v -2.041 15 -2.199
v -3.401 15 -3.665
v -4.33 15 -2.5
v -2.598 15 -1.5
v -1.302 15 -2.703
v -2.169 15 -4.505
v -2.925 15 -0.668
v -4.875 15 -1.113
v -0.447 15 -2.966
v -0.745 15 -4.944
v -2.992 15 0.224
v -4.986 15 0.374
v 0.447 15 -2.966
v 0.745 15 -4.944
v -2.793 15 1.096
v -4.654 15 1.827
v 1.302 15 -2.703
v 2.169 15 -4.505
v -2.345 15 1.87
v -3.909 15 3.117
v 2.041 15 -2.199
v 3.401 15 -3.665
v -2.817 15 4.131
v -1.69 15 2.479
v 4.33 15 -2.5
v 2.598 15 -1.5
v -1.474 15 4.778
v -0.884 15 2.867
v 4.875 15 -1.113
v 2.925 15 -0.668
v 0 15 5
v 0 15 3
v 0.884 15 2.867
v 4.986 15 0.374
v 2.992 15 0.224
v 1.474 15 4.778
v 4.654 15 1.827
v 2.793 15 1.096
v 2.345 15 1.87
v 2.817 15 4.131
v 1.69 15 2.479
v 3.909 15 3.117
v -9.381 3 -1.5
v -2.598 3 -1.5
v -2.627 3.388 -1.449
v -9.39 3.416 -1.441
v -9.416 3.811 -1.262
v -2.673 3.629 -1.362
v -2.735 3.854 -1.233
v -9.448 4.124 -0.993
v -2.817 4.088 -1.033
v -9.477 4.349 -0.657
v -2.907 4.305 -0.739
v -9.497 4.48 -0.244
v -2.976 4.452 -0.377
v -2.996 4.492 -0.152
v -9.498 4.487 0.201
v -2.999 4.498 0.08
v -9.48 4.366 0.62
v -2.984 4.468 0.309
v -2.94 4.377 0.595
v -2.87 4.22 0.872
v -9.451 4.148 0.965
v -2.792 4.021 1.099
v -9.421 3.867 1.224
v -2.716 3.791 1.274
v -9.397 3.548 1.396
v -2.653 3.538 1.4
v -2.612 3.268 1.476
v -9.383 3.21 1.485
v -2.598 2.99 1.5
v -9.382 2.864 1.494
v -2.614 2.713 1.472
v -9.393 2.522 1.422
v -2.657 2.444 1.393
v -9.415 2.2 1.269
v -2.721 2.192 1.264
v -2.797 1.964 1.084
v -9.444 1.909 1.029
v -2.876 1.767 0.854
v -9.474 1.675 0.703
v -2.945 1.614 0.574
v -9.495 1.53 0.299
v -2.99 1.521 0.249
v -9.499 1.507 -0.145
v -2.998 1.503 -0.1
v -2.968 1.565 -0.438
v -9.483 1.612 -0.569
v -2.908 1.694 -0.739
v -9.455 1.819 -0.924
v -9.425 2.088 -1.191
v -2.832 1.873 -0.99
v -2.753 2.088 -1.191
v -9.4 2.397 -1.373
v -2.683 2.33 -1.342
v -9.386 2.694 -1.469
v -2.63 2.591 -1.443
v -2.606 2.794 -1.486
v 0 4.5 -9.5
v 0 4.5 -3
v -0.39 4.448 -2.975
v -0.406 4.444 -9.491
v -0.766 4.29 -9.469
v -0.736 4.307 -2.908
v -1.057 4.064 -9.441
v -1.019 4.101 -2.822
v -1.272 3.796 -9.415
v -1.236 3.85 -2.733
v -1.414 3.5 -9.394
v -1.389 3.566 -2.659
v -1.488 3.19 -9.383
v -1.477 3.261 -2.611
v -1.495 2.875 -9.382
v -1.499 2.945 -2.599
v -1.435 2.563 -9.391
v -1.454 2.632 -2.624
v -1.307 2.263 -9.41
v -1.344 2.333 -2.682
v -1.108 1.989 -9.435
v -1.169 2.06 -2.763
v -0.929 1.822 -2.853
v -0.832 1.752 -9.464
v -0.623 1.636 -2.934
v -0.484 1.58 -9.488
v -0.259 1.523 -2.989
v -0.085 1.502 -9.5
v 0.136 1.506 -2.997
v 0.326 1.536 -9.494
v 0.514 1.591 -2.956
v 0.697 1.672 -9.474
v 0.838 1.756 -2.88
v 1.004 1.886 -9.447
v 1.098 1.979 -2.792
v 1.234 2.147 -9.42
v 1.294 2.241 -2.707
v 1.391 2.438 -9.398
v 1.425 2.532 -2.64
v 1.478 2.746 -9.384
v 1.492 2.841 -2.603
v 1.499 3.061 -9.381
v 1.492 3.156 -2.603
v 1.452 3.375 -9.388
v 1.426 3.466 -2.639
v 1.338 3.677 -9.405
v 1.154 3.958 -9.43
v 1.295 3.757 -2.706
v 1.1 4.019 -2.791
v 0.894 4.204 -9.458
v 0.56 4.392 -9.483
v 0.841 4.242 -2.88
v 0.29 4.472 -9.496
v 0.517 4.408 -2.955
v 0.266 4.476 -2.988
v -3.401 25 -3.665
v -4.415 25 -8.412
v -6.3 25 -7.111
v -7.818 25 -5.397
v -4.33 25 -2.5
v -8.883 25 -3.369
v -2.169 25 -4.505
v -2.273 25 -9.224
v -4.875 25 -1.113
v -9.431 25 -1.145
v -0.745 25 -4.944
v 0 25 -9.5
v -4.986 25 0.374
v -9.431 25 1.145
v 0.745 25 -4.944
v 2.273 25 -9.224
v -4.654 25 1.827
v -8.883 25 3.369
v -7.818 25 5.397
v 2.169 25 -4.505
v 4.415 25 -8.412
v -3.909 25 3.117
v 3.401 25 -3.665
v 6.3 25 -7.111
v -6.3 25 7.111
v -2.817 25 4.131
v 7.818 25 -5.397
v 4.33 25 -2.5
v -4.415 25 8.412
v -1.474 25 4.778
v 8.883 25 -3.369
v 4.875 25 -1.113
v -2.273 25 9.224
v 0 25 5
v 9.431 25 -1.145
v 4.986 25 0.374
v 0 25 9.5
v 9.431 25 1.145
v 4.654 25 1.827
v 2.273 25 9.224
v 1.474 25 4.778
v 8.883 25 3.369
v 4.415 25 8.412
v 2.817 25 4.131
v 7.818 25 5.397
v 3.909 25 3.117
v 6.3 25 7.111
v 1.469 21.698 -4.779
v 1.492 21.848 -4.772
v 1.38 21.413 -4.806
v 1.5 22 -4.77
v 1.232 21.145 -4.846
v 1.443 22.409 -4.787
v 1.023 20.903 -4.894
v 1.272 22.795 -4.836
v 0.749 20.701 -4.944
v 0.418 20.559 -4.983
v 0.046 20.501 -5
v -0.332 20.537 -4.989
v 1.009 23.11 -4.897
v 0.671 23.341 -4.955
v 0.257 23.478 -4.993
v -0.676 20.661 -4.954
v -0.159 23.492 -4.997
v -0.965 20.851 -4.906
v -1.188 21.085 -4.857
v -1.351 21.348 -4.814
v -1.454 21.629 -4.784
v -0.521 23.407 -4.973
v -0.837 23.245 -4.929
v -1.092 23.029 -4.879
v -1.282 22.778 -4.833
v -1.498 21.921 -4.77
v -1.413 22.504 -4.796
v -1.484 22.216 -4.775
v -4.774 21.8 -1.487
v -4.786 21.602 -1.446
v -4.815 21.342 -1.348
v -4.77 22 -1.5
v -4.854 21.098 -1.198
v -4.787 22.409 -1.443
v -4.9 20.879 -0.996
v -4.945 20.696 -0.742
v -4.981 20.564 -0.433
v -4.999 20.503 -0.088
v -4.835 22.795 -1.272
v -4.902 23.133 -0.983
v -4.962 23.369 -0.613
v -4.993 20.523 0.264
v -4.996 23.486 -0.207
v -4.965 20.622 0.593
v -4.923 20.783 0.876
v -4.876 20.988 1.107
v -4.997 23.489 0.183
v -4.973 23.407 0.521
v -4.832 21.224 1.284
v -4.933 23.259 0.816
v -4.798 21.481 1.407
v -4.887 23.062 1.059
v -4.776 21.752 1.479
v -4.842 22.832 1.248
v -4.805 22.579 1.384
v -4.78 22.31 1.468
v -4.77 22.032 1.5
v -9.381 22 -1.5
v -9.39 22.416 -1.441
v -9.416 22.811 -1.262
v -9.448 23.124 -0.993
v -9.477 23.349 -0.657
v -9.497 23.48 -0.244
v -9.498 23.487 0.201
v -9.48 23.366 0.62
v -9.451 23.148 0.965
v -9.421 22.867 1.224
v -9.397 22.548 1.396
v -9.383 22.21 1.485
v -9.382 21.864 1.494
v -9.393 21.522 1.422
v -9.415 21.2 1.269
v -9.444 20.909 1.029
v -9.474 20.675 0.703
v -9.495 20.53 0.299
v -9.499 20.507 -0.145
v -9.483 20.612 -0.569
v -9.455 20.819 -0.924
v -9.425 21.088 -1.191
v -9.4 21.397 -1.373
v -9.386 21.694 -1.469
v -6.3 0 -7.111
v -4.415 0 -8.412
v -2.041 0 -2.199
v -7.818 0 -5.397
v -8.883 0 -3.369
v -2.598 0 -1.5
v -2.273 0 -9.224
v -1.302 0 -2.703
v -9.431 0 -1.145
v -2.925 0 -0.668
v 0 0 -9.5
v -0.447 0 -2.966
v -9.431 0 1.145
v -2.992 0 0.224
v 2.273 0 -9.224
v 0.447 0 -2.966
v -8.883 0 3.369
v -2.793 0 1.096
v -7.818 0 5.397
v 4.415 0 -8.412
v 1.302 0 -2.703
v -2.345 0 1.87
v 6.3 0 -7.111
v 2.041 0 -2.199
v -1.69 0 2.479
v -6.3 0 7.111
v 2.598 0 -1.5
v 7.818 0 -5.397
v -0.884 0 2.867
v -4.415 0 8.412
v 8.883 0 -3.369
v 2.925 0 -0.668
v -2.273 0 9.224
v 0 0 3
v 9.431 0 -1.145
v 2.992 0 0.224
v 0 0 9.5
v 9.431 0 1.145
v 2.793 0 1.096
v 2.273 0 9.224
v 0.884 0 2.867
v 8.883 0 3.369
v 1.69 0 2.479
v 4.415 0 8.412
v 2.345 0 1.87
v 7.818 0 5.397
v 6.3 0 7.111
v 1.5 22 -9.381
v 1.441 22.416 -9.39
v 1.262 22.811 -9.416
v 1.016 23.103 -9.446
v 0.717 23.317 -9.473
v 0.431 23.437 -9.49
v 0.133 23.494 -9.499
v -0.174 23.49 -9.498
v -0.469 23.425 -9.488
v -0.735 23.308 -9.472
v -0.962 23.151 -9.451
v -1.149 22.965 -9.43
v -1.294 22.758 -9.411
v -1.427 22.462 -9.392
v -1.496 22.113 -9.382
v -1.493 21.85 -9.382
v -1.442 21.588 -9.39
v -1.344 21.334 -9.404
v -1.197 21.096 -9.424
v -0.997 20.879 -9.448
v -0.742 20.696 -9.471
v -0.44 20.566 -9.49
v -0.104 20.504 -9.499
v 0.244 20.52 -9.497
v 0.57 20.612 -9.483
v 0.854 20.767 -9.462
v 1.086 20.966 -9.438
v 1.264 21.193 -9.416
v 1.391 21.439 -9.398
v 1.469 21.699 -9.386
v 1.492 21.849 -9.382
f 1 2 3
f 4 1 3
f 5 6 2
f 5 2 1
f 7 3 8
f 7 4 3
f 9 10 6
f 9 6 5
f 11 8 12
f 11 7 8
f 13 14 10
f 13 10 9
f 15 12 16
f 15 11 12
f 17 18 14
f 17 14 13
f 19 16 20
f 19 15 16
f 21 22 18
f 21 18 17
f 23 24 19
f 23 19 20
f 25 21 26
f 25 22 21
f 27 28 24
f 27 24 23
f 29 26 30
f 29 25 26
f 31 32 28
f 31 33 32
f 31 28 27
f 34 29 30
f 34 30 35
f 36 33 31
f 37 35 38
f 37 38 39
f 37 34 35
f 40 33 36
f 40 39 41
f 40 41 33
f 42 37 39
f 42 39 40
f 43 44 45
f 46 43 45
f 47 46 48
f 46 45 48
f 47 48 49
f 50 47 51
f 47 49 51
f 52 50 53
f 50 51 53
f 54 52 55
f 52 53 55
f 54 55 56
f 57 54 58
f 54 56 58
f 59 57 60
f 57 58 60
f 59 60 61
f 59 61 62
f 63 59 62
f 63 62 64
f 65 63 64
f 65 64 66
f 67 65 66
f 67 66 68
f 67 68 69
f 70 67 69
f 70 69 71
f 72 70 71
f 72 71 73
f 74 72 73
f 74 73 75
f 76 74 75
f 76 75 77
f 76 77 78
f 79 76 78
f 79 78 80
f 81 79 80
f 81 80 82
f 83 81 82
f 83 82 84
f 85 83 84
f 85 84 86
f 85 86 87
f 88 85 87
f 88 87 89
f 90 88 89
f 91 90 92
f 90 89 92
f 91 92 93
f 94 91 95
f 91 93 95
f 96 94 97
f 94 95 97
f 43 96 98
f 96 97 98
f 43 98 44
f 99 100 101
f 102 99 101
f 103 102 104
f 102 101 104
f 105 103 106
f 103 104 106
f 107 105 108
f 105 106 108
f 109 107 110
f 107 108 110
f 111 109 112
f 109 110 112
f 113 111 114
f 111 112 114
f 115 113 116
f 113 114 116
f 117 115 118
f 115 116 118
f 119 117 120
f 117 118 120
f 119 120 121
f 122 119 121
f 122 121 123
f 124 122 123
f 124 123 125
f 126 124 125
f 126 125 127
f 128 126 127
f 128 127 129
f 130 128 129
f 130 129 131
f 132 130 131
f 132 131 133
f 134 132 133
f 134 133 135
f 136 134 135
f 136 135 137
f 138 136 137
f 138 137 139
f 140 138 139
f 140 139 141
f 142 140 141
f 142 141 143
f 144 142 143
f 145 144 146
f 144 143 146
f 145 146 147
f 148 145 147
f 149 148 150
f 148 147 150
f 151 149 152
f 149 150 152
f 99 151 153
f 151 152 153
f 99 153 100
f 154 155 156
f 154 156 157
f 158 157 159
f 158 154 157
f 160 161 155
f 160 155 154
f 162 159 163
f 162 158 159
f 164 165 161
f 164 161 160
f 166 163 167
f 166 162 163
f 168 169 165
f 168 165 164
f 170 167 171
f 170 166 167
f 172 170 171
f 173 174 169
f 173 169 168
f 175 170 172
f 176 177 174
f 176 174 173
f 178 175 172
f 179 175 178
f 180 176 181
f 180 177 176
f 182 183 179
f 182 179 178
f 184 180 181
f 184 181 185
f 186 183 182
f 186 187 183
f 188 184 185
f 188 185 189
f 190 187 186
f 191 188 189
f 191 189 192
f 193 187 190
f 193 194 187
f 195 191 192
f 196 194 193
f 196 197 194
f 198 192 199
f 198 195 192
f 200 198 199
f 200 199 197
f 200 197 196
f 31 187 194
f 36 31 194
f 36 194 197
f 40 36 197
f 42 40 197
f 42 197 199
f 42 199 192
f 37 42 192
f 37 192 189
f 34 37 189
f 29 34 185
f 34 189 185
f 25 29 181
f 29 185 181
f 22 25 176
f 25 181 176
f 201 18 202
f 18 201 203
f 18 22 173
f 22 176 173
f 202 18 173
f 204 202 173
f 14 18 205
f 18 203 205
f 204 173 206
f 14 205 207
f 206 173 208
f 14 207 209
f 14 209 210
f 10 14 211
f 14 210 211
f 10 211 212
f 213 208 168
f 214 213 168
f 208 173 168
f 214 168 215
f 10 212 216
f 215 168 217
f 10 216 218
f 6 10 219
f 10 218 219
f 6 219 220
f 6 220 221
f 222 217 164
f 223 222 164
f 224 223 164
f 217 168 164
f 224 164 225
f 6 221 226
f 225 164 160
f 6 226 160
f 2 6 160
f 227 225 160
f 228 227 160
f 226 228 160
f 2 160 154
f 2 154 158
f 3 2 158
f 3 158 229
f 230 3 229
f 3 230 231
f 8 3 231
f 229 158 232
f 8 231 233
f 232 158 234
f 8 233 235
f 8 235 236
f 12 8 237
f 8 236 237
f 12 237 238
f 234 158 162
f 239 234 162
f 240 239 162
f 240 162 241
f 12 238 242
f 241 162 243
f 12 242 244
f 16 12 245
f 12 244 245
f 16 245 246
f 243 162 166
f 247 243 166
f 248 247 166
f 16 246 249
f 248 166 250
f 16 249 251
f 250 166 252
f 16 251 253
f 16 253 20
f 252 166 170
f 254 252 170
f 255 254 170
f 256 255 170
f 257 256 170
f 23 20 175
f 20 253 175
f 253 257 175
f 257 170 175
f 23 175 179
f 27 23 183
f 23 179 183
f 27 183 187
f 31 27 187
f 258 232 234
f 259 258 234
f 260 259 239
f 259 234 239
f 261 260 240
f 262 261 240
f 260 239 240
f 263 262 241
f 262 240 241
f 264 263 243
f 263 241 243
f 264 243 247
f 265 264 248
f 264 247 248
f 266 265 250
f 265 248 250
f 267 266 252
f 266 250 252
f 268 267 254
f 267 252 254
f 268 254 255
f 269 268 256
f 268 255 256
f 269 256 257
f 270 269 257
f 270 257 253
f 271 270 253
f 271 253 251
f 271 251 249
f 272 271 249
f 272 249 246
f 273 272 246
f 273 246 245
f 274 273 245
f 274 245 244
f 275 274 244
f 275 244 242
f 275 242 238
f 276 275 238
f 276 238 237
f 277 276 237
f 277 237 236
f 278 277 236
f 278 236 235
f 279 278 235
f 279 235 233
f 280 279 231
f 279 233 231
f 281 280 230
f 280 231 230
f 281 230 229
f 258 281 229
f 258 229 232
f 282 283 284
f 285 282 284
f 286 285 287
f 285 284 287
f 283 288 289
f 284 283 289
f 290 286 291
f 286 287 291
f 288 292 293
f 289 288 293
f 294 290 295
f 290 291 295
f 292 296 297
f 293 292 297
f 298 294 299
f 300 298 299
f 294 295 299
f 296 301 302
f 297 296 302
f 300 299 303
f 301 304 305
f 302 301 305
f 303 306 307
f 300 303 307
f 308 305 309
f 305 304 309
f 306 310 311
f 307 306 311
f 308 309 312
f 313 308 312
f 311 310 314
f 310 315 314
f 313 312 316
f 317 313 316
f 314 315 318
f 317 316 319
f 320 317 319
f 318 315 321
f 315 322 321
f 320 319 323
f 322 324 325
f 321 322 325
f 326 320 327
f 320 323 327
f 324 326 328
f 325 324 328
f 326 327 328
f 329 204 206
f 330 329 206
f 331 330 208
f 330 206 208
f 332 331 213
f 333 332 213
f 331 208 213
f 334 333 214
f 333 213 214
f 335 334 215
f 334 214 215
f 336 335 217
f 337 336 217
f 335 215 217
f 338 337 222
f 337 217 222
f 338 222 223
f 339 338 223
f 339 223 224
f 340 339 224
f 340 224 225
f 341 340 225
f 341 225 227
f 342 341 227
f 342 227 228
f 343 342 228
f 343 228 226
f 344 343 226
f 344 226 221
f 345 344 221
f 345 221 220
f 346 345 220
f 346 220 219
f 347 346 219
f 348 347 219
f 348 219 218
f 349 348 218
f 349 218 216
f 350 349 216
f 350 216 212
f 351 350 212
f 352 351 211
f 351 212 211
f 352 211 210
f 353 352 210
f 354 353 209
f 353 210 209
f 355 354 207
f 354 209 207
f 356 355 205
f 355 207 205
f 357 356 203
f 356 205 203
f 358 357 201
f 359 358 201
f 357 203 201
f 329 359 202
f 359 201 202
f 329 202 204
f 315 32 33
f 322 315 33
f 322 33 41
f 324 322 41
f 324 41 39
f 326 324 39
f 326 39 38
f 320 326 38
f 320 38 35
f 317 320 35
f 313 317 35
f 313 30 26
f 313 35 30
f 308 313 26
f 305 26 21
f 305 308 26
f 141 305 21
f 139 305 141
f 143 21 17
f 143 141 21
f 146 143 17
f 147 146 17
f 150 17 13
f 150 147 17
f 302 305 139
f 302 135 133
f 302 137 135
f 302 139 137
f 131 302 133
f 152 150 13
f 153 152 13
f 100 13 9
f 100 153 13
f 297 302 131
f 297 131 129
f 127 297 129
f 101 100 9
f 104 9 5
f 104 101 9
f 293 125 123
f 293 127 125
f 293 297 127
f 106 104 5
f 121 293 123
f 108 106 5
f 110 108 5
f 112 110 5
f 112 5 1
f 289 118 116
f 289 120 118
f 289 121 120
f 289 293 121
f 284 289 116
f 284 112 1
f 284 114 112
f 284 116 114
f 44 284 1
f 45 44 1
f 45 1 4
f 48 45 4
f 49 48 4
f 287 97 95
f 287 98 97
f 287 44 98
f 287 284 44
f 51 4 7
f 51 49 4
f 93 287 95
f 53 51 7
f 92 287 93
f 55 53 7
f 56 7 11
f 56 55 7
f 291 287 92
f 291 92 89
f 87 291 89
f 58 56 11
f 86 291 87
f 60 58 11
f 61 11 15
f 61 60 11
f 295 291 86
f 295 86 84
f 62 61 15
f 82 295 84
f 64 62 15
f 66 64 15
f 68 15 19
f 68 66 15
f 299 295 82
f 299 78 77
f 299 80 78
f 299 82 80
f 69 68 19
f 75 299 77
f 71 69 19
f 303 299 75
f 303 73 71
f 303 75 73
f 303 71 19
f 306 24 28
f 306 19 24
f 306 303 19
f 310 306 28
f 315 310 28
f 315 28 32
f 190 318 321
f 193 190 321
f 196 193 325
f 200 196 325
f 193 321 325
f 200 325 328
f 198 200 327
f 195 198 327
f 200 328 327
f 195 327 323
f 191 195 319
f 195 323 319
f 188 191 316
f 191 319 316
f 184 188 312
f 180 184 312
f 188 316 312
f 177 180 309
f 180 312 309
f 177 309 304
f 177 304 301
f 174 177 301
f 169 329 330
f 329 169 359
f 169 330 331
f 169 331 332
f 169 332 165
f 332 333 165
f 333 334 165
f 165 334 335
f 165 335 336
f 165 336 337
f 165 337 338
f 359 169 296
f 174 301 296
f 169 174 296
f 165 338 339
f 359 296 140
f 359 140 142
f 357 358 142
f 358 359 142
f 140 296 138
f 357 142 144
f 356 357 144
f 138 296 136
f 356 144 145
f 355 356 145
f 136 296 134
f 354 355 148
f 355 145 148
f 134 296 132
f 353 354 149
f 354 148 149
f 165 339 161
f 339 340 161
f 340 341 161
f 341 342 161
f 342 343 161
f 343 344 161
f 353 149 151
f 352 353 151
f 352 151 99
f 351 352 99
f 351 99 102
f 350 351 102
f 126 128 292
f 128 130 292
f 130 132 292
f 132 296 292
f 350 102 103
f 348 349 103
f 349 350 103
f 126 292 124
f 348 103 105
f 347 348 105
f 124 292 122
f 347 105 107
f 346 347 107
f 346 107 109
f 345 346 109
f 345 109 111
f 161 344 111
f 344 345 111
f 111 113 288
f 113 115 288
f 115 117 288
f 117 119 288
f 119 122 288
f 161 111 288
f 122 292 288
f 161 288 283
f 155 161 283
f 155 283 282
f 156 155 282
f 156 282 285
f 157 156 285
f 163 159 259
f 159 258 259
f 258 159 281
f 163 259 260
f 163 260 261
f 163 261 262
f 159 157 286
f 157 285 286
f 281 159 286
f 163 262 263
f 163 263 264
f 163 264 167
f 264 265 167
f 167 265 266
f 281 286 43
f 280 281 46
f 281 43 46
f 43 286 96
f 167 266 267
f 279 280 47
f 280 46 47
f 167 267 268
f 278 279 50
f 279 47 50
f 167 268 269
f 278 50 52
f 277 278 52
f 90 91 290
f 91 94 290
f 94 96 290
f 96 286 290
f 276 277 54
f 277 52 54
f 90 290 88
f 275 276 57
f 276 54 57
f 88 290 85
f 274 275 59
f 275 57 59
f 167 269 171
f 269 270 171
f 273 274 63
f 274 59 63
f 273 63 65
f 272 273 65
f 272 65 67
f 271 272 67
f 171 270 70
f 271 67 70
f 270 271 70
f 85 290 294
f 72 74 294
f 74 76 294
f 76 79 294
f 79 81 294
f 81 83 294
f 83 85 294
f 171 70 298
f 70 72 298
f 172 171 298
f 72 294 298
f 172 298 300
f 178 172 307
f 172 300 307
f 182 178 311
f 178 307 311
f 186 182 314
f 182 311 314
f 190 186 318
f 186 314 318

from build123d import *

# Parameters (mm, degrees)
SKETCH_1_R          = 9.5
SKETCH_1_R_2        = 3
EXTRUDE_1_DEPTH     = 25
SKETCH_2_R          = 5
CUT_EXTRUDE_1_DEPTH = 10
SKETCH_3_R          = 1.5
CUT_EXTRUDE_2_DEPTH = 10
SKETCH_4_R          = 1.5
CUT_EXTRUDE_3_DEPTH = 10


with BuildPart() as part:
    # 草图1 → 凸台-拉伸1 (new body)
    with BuildSketch(Plane(origin=(0, 0, 0), x_dir=(1, 0, 0), z_dir=(0, 1, 0))):
        with Locations(Location((0, 0, 0), (0, 0, 270))):
            Circle(SKETCH_1_R)
        with Locations(Location((0, 0, 0), (0, 0, 270))):
            Circle(SKETCH_1_R_2, mode=Mode.SUBTRACT)
    extrude(amount=EXTRUDE_1_DEPTH)

    # 草图2 → 切除-拉伸1 (cut)
    with BuildSketch(Plane(origin=(0, 25, 0), x_dir=(1, 0, 0), z_dir=(0, 1, 0))):
        with Locations(Location((0, 0, 0), (0, 0, 270))):
            Circle(SKETCH_2_R)
    extrude(amount=-CUT_EXTRUDE_1_DEPTH, mode=Mode.SUBTRACT)

    # 草图3 → 切除-拉伸2 (cut)
    with BuildSketch(Plane(origin=(0, 0, 0), x_dir=(0, 0, -1), z_dir=(1, 0, 0))):
        with Locations((0, 3)):
            Circle(SKETCH_3_R)
        with Locations((0, 22)):
            Circle(SKETCH_3_R)
    extrude(amount=-CUT_EXTRUDE_2_DEPTH, mode=Mode.SUBTRACT)

    # 草图4 → 切除-拉伸3 (cut)
    with BuildSketch(Plane.XY):
        with Locations(Location((0, 3, 0), (0, 0, 90))):
            Circle(SKETCH_4_R)
        with Locations((0, 22)):
            Circle(SKETCH_4_R)
    extrude(amount=-CUT_EXTRUDE_3_DEPTH, mode=Mode.SUBTRACT)


solid = part.part
